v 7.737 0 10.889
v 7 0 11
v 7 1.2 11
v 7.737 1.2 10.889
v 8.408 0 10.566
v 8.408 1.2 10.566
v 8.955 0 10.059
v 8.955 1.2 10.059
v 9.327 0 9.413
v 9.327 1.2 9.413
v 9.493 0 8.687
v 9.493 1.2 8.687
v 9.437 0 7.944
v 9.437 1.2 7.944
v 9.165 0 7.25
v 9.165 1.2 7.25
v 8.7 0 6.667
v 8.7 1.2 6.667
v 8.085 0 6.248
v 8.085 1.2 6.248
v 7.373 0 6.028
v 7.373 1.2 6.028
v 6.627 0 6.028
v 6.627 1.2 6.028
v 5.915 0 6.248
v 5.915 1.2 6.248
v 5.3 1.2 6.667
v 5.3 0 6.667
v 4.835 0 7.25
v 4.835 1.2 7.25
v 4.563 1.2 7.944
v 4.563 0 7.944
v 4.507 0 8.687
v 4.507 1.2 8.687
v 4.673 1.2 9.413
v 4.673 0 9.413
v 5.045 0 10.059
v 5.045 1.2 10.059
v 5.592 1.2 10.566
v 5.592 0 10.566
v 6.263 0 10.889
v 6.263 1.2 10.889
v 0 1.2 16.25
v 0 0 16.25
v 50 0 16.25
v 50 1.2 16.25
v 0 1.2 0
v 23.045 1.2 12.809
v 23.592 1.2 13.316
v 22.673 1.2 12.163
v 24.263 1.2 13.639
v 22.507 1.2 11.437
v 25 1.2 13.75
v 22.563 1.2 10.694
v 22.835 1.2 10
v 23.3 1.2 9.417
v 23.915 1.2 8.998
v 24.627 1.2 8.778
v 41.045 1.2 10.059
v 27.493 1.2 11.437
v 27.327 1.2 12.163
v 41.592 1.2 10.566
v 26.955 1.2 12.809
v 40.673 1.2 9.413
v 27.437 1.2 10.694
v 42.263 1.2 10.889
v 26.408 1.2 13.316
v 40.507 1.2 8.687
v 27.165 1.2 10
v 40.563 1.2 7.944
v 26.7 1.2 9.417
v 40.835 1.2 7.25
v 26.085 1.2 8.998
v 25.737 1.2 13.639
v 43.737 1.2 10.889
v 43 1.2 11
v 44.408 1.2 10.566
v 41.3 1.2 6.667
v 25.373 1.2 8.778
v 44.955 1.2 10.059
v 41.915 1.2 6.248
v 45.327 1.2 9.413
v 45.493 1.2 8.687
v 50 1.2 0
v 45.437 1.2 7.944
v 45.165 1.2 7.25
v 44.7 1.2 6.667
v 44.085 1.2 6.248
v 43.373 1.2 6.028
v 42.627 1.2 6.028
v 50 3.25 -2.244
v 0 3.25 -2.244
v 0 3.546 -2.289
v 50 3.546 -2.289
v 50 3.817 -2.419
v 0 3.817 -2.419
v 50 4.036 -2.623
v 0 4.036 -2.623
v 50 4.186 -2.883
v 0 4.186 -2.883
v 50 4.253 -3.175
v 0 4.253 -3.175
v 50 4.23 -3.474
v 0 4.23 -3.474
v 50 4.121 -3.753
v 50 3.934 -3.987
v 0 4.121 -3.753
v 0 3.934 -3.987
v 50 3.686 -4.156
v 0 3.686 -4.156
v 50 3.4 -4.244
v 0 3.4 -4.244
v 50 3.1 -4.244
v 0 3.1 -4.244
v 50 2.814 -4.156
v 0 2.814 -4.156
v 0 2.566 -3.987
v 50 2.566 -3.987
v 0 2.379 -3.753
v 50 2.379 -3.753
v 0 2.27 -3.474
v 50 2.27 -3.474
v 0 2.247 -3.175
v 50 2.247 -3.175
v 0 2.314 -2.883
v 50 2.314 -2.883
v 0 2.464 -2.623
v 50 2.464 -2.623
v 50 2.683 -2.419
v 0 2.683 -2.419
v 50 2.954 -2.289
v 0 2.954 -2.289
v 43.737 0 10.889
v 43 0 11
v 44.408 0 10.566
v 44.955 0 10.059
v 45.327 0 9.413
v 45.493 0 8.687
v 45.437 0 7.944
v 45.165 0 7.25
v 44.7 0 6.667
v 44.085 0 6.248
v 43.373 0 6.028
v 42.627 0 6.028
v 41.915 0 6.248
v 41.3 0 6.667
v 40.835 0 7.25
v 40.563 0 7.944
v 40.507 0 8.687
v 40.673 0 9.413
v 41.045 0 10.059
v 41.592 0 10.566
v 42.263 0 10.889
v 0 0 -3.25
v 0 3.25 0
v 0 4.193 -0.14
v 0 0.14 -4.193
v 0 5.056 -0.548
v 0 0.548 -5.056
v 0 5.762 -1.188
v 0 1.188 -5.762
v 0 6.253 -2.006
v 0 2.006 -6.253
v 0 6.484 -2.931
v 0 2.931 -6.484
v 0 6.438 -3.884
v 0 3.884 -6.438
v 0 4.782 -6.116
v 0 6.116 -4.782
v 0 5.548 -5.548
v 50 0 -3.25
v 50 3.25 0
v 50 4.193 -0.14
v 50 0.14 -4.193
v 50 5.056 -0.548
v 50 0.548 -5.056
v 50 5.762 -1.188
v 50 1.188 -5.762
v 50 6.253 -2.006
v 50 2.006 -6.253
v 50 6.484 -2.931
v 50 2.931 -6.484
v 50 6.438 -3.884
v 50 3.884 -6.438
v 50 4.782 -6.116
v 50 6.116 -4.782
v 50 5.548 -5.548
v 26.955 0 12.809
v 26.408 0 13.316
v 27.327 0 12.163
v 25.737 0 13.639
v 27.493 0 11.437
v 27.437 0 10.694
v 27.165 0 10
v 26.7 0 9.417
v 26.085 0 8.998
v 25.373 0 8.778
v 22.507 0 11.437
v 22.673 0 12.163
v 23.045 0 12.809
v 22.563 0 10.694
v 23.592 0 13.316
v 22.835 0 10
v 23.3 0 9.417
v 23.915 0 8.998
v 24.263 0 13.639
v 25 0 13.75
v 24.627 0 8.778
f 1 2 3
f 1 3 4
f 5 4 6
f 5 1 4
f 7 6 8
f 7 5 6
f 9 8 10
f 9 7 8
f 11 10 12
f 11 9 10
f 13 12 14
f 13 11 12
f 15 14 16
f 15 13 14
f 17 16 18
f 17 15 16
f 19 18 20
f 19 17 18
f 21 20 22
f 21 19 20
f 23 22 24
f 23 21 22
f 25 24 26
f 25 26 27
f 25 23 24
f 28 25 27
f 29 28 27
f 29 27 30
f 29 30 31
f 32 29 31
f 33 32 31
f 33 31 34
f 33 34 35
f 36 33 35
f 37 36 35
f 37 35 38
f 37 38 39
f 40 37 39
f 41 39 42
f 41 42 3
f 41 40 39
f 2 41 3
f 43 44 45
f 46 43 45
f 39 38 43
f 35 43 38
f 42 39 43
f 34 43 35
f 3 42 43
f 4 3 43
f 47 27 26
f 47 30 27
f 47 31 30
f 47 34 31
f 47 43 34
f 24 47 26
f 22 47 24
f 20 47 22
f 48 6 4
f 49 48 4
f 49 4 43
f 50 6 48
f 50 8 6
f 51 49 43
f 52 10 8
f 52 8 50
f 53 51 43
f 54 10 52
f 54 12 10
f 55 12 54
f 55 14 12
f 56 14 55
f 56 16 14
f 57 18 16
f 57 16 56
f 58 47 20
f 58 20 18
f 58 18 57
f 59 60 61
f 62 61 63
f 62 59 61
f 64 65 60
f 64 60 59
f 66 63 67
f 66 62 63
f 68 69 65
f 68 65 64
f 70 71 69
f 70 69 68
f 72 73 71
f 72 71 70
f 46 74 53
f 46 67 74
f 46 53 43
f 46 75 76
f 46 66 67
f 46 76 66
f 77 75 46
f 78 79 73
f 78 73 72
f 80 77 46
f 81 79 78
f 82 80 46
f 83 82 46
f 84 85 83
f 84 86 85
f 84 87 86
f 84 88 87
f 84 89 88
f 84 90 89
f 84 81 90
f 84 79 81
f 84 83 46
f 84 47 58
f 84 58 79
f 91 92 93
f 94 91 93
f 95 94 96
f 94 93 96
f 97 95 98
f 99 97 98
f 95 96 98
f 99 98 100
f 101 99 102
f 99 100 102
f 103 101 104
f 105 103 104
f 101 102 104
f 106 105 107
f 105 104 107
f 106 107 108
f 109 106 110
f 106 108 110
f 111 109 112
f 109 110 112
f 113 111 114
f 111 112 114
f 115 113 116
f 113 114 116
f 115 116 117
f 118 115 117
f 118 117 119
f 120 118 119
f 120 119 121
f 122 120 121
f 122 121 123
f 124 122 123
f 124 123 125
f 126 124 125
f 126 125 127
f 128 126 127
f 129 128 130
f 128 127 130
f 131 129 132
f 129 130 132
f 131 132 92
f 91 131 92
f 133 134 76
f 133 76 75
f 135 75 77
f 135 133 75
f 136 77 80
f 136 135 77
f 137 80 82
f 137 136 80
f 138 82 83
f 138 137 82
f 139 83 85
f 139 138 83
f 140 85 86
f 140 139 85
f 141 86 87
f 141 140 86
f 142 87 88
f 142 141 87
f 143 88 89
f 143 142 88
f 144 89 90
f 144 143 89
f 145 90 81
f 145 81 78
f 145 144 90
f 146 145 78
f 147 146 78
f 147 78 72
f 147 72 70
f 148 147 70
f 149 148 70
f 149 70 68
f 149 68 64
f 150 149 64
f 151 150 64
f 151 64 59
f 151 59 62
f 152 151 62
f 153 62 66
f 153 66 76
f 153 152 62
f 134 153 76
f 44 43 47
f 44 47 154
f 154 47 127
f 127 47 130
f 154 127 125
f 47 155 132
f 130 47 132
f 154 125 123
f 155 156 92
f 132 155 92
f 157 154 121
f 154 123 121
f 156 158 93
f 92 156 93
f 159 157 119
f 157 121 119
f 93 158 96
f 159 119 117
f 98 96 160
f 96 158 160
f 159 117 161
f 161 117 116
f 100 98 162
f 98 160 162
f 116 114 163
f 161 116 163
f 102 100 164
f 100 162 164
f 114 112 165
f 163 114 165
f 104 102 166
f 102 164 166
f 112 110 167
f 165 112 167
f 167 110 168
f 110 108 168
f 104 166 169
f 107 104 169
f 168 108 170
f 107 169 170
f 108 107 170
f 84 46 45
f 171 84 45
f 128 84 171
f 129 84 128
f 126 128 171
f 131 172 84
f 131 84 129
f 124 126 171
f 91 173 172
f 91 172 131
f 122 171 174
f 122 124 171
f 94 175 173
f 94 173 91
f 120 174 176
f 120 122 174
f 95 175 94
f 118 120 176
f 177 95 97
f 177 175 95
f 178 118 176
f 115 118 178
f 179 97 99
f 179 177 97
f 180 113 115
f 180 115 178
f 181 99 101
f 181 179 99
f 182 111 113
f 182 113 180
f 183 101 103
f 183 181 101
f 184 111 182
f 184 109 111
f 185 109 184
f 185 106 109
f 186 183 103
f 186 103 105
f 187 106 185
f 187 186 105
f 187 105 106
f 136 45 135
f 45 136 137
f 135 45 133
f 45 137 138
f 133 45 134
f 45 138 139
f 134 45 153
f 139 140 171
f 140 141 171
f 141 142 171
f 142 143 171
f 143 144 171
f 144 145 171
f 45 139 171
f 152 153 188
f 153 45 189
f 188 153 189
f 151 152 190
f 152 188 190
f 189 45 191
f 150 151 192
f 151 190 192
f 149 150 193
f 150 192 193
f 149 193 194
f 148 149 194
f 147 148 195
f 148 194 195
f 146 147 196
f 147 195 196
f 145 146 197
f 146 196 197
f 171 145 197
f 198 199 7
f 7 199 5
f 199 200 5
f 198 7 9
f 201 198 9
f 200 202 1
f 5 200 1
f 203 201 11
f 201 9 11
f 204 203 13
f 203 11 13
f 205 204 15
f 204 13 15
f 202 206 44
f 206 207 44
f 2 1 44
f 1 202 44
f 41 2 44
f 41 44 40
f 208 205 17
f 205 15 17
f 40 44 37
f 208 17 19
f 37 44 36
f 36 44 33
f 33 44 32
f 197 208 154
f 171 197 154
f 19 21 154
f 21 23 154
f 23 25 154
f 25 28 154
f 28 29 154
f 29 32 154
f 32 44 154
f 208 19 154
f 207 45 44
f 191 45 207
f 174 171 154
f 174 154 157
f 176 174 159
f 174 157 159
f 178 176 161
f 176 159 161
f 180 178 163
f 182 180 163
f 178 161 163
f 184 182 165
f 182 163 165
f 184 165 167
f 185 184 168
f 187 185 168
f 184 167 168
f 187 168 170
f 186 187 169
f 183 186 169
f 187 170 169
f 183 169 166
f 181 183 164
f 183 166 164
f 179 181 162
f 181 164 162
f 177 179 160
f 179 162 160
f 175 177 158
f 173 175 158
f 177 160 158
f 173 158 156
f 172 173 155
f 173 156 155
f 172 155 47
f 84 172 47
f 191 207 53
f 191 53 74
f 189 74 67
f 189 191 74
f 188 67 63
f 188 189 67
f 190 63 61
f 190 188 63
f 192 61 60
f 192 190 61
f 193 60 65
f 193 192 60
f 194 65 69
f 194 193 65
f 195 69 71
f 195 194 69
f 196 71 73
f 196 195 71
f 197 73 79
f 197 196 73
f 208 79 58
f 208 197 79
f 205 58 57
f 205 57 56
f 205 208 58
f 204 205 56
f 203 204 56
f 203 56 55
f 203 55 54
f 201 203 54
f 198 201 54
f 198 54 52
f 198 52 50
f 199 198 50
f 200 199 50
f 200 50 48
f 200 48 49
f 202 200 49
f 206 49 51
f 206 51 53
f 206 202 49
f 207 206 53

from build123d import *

# Parameters (mm, degrees)
SKETCH_1_W      = 50
SKETCH_1_H      = 16.25
SKETCH_1_R      = 2.5
EXTRUDE_1_DEPTH = 1.2
SKETCH_2_R      = 1.005653766
EXTRUDE_2_DEPTH = 50


with BuildPart() as part:
    # 草图1 → 凸台-拉伸1 (new body)
    with BuildSketch(Plane(origin=(0, 0, 0), x_dir=(1, 0, 0), z_dir=(0, 1, 0))):
        with Locations((25, -8.125)):
            Rectangle(SKETCH_1_W, SKETCH_1_H)
        with Locations(Location((7, -8.5, 0), (0, 0, 270))):
            Circle(SKETCH_1_R, mode=Mode.SUBTRACT)
        with Locations(Location((43, -8.5, 0), (0, 0, 270))):
            Circle(SKETCH_1_R, mode=Mode.SUBTRACT)
        with Locations(Location((25, -11.25, 0), (0, 0, 270))):
            Circle(SKETCH_1_R, mode=Mode.SUBTRACT)
    extrude(amount=EXTRUDE_1_DEPTH)

    # 草图2 → 凸台-拉伸2 (add)
    with BuildSketch(Plane.ZY):
        with BuildLine():
            Line((0, 0), (-3.25, 0))
            ThreePointArc((-3.25, 0), (-5.548097039, 5.548097039), (0, 3.25))
            Line((0, 3.25), (0, 0))
        make_face()
        with Locations((-3.25, 3.25)):
            Circle(SKETCH_2_R, mode=Mode.SUBTRACT)
    extrude(amount=-EXTRUDE_2_DEPTH)


solid = part.part
